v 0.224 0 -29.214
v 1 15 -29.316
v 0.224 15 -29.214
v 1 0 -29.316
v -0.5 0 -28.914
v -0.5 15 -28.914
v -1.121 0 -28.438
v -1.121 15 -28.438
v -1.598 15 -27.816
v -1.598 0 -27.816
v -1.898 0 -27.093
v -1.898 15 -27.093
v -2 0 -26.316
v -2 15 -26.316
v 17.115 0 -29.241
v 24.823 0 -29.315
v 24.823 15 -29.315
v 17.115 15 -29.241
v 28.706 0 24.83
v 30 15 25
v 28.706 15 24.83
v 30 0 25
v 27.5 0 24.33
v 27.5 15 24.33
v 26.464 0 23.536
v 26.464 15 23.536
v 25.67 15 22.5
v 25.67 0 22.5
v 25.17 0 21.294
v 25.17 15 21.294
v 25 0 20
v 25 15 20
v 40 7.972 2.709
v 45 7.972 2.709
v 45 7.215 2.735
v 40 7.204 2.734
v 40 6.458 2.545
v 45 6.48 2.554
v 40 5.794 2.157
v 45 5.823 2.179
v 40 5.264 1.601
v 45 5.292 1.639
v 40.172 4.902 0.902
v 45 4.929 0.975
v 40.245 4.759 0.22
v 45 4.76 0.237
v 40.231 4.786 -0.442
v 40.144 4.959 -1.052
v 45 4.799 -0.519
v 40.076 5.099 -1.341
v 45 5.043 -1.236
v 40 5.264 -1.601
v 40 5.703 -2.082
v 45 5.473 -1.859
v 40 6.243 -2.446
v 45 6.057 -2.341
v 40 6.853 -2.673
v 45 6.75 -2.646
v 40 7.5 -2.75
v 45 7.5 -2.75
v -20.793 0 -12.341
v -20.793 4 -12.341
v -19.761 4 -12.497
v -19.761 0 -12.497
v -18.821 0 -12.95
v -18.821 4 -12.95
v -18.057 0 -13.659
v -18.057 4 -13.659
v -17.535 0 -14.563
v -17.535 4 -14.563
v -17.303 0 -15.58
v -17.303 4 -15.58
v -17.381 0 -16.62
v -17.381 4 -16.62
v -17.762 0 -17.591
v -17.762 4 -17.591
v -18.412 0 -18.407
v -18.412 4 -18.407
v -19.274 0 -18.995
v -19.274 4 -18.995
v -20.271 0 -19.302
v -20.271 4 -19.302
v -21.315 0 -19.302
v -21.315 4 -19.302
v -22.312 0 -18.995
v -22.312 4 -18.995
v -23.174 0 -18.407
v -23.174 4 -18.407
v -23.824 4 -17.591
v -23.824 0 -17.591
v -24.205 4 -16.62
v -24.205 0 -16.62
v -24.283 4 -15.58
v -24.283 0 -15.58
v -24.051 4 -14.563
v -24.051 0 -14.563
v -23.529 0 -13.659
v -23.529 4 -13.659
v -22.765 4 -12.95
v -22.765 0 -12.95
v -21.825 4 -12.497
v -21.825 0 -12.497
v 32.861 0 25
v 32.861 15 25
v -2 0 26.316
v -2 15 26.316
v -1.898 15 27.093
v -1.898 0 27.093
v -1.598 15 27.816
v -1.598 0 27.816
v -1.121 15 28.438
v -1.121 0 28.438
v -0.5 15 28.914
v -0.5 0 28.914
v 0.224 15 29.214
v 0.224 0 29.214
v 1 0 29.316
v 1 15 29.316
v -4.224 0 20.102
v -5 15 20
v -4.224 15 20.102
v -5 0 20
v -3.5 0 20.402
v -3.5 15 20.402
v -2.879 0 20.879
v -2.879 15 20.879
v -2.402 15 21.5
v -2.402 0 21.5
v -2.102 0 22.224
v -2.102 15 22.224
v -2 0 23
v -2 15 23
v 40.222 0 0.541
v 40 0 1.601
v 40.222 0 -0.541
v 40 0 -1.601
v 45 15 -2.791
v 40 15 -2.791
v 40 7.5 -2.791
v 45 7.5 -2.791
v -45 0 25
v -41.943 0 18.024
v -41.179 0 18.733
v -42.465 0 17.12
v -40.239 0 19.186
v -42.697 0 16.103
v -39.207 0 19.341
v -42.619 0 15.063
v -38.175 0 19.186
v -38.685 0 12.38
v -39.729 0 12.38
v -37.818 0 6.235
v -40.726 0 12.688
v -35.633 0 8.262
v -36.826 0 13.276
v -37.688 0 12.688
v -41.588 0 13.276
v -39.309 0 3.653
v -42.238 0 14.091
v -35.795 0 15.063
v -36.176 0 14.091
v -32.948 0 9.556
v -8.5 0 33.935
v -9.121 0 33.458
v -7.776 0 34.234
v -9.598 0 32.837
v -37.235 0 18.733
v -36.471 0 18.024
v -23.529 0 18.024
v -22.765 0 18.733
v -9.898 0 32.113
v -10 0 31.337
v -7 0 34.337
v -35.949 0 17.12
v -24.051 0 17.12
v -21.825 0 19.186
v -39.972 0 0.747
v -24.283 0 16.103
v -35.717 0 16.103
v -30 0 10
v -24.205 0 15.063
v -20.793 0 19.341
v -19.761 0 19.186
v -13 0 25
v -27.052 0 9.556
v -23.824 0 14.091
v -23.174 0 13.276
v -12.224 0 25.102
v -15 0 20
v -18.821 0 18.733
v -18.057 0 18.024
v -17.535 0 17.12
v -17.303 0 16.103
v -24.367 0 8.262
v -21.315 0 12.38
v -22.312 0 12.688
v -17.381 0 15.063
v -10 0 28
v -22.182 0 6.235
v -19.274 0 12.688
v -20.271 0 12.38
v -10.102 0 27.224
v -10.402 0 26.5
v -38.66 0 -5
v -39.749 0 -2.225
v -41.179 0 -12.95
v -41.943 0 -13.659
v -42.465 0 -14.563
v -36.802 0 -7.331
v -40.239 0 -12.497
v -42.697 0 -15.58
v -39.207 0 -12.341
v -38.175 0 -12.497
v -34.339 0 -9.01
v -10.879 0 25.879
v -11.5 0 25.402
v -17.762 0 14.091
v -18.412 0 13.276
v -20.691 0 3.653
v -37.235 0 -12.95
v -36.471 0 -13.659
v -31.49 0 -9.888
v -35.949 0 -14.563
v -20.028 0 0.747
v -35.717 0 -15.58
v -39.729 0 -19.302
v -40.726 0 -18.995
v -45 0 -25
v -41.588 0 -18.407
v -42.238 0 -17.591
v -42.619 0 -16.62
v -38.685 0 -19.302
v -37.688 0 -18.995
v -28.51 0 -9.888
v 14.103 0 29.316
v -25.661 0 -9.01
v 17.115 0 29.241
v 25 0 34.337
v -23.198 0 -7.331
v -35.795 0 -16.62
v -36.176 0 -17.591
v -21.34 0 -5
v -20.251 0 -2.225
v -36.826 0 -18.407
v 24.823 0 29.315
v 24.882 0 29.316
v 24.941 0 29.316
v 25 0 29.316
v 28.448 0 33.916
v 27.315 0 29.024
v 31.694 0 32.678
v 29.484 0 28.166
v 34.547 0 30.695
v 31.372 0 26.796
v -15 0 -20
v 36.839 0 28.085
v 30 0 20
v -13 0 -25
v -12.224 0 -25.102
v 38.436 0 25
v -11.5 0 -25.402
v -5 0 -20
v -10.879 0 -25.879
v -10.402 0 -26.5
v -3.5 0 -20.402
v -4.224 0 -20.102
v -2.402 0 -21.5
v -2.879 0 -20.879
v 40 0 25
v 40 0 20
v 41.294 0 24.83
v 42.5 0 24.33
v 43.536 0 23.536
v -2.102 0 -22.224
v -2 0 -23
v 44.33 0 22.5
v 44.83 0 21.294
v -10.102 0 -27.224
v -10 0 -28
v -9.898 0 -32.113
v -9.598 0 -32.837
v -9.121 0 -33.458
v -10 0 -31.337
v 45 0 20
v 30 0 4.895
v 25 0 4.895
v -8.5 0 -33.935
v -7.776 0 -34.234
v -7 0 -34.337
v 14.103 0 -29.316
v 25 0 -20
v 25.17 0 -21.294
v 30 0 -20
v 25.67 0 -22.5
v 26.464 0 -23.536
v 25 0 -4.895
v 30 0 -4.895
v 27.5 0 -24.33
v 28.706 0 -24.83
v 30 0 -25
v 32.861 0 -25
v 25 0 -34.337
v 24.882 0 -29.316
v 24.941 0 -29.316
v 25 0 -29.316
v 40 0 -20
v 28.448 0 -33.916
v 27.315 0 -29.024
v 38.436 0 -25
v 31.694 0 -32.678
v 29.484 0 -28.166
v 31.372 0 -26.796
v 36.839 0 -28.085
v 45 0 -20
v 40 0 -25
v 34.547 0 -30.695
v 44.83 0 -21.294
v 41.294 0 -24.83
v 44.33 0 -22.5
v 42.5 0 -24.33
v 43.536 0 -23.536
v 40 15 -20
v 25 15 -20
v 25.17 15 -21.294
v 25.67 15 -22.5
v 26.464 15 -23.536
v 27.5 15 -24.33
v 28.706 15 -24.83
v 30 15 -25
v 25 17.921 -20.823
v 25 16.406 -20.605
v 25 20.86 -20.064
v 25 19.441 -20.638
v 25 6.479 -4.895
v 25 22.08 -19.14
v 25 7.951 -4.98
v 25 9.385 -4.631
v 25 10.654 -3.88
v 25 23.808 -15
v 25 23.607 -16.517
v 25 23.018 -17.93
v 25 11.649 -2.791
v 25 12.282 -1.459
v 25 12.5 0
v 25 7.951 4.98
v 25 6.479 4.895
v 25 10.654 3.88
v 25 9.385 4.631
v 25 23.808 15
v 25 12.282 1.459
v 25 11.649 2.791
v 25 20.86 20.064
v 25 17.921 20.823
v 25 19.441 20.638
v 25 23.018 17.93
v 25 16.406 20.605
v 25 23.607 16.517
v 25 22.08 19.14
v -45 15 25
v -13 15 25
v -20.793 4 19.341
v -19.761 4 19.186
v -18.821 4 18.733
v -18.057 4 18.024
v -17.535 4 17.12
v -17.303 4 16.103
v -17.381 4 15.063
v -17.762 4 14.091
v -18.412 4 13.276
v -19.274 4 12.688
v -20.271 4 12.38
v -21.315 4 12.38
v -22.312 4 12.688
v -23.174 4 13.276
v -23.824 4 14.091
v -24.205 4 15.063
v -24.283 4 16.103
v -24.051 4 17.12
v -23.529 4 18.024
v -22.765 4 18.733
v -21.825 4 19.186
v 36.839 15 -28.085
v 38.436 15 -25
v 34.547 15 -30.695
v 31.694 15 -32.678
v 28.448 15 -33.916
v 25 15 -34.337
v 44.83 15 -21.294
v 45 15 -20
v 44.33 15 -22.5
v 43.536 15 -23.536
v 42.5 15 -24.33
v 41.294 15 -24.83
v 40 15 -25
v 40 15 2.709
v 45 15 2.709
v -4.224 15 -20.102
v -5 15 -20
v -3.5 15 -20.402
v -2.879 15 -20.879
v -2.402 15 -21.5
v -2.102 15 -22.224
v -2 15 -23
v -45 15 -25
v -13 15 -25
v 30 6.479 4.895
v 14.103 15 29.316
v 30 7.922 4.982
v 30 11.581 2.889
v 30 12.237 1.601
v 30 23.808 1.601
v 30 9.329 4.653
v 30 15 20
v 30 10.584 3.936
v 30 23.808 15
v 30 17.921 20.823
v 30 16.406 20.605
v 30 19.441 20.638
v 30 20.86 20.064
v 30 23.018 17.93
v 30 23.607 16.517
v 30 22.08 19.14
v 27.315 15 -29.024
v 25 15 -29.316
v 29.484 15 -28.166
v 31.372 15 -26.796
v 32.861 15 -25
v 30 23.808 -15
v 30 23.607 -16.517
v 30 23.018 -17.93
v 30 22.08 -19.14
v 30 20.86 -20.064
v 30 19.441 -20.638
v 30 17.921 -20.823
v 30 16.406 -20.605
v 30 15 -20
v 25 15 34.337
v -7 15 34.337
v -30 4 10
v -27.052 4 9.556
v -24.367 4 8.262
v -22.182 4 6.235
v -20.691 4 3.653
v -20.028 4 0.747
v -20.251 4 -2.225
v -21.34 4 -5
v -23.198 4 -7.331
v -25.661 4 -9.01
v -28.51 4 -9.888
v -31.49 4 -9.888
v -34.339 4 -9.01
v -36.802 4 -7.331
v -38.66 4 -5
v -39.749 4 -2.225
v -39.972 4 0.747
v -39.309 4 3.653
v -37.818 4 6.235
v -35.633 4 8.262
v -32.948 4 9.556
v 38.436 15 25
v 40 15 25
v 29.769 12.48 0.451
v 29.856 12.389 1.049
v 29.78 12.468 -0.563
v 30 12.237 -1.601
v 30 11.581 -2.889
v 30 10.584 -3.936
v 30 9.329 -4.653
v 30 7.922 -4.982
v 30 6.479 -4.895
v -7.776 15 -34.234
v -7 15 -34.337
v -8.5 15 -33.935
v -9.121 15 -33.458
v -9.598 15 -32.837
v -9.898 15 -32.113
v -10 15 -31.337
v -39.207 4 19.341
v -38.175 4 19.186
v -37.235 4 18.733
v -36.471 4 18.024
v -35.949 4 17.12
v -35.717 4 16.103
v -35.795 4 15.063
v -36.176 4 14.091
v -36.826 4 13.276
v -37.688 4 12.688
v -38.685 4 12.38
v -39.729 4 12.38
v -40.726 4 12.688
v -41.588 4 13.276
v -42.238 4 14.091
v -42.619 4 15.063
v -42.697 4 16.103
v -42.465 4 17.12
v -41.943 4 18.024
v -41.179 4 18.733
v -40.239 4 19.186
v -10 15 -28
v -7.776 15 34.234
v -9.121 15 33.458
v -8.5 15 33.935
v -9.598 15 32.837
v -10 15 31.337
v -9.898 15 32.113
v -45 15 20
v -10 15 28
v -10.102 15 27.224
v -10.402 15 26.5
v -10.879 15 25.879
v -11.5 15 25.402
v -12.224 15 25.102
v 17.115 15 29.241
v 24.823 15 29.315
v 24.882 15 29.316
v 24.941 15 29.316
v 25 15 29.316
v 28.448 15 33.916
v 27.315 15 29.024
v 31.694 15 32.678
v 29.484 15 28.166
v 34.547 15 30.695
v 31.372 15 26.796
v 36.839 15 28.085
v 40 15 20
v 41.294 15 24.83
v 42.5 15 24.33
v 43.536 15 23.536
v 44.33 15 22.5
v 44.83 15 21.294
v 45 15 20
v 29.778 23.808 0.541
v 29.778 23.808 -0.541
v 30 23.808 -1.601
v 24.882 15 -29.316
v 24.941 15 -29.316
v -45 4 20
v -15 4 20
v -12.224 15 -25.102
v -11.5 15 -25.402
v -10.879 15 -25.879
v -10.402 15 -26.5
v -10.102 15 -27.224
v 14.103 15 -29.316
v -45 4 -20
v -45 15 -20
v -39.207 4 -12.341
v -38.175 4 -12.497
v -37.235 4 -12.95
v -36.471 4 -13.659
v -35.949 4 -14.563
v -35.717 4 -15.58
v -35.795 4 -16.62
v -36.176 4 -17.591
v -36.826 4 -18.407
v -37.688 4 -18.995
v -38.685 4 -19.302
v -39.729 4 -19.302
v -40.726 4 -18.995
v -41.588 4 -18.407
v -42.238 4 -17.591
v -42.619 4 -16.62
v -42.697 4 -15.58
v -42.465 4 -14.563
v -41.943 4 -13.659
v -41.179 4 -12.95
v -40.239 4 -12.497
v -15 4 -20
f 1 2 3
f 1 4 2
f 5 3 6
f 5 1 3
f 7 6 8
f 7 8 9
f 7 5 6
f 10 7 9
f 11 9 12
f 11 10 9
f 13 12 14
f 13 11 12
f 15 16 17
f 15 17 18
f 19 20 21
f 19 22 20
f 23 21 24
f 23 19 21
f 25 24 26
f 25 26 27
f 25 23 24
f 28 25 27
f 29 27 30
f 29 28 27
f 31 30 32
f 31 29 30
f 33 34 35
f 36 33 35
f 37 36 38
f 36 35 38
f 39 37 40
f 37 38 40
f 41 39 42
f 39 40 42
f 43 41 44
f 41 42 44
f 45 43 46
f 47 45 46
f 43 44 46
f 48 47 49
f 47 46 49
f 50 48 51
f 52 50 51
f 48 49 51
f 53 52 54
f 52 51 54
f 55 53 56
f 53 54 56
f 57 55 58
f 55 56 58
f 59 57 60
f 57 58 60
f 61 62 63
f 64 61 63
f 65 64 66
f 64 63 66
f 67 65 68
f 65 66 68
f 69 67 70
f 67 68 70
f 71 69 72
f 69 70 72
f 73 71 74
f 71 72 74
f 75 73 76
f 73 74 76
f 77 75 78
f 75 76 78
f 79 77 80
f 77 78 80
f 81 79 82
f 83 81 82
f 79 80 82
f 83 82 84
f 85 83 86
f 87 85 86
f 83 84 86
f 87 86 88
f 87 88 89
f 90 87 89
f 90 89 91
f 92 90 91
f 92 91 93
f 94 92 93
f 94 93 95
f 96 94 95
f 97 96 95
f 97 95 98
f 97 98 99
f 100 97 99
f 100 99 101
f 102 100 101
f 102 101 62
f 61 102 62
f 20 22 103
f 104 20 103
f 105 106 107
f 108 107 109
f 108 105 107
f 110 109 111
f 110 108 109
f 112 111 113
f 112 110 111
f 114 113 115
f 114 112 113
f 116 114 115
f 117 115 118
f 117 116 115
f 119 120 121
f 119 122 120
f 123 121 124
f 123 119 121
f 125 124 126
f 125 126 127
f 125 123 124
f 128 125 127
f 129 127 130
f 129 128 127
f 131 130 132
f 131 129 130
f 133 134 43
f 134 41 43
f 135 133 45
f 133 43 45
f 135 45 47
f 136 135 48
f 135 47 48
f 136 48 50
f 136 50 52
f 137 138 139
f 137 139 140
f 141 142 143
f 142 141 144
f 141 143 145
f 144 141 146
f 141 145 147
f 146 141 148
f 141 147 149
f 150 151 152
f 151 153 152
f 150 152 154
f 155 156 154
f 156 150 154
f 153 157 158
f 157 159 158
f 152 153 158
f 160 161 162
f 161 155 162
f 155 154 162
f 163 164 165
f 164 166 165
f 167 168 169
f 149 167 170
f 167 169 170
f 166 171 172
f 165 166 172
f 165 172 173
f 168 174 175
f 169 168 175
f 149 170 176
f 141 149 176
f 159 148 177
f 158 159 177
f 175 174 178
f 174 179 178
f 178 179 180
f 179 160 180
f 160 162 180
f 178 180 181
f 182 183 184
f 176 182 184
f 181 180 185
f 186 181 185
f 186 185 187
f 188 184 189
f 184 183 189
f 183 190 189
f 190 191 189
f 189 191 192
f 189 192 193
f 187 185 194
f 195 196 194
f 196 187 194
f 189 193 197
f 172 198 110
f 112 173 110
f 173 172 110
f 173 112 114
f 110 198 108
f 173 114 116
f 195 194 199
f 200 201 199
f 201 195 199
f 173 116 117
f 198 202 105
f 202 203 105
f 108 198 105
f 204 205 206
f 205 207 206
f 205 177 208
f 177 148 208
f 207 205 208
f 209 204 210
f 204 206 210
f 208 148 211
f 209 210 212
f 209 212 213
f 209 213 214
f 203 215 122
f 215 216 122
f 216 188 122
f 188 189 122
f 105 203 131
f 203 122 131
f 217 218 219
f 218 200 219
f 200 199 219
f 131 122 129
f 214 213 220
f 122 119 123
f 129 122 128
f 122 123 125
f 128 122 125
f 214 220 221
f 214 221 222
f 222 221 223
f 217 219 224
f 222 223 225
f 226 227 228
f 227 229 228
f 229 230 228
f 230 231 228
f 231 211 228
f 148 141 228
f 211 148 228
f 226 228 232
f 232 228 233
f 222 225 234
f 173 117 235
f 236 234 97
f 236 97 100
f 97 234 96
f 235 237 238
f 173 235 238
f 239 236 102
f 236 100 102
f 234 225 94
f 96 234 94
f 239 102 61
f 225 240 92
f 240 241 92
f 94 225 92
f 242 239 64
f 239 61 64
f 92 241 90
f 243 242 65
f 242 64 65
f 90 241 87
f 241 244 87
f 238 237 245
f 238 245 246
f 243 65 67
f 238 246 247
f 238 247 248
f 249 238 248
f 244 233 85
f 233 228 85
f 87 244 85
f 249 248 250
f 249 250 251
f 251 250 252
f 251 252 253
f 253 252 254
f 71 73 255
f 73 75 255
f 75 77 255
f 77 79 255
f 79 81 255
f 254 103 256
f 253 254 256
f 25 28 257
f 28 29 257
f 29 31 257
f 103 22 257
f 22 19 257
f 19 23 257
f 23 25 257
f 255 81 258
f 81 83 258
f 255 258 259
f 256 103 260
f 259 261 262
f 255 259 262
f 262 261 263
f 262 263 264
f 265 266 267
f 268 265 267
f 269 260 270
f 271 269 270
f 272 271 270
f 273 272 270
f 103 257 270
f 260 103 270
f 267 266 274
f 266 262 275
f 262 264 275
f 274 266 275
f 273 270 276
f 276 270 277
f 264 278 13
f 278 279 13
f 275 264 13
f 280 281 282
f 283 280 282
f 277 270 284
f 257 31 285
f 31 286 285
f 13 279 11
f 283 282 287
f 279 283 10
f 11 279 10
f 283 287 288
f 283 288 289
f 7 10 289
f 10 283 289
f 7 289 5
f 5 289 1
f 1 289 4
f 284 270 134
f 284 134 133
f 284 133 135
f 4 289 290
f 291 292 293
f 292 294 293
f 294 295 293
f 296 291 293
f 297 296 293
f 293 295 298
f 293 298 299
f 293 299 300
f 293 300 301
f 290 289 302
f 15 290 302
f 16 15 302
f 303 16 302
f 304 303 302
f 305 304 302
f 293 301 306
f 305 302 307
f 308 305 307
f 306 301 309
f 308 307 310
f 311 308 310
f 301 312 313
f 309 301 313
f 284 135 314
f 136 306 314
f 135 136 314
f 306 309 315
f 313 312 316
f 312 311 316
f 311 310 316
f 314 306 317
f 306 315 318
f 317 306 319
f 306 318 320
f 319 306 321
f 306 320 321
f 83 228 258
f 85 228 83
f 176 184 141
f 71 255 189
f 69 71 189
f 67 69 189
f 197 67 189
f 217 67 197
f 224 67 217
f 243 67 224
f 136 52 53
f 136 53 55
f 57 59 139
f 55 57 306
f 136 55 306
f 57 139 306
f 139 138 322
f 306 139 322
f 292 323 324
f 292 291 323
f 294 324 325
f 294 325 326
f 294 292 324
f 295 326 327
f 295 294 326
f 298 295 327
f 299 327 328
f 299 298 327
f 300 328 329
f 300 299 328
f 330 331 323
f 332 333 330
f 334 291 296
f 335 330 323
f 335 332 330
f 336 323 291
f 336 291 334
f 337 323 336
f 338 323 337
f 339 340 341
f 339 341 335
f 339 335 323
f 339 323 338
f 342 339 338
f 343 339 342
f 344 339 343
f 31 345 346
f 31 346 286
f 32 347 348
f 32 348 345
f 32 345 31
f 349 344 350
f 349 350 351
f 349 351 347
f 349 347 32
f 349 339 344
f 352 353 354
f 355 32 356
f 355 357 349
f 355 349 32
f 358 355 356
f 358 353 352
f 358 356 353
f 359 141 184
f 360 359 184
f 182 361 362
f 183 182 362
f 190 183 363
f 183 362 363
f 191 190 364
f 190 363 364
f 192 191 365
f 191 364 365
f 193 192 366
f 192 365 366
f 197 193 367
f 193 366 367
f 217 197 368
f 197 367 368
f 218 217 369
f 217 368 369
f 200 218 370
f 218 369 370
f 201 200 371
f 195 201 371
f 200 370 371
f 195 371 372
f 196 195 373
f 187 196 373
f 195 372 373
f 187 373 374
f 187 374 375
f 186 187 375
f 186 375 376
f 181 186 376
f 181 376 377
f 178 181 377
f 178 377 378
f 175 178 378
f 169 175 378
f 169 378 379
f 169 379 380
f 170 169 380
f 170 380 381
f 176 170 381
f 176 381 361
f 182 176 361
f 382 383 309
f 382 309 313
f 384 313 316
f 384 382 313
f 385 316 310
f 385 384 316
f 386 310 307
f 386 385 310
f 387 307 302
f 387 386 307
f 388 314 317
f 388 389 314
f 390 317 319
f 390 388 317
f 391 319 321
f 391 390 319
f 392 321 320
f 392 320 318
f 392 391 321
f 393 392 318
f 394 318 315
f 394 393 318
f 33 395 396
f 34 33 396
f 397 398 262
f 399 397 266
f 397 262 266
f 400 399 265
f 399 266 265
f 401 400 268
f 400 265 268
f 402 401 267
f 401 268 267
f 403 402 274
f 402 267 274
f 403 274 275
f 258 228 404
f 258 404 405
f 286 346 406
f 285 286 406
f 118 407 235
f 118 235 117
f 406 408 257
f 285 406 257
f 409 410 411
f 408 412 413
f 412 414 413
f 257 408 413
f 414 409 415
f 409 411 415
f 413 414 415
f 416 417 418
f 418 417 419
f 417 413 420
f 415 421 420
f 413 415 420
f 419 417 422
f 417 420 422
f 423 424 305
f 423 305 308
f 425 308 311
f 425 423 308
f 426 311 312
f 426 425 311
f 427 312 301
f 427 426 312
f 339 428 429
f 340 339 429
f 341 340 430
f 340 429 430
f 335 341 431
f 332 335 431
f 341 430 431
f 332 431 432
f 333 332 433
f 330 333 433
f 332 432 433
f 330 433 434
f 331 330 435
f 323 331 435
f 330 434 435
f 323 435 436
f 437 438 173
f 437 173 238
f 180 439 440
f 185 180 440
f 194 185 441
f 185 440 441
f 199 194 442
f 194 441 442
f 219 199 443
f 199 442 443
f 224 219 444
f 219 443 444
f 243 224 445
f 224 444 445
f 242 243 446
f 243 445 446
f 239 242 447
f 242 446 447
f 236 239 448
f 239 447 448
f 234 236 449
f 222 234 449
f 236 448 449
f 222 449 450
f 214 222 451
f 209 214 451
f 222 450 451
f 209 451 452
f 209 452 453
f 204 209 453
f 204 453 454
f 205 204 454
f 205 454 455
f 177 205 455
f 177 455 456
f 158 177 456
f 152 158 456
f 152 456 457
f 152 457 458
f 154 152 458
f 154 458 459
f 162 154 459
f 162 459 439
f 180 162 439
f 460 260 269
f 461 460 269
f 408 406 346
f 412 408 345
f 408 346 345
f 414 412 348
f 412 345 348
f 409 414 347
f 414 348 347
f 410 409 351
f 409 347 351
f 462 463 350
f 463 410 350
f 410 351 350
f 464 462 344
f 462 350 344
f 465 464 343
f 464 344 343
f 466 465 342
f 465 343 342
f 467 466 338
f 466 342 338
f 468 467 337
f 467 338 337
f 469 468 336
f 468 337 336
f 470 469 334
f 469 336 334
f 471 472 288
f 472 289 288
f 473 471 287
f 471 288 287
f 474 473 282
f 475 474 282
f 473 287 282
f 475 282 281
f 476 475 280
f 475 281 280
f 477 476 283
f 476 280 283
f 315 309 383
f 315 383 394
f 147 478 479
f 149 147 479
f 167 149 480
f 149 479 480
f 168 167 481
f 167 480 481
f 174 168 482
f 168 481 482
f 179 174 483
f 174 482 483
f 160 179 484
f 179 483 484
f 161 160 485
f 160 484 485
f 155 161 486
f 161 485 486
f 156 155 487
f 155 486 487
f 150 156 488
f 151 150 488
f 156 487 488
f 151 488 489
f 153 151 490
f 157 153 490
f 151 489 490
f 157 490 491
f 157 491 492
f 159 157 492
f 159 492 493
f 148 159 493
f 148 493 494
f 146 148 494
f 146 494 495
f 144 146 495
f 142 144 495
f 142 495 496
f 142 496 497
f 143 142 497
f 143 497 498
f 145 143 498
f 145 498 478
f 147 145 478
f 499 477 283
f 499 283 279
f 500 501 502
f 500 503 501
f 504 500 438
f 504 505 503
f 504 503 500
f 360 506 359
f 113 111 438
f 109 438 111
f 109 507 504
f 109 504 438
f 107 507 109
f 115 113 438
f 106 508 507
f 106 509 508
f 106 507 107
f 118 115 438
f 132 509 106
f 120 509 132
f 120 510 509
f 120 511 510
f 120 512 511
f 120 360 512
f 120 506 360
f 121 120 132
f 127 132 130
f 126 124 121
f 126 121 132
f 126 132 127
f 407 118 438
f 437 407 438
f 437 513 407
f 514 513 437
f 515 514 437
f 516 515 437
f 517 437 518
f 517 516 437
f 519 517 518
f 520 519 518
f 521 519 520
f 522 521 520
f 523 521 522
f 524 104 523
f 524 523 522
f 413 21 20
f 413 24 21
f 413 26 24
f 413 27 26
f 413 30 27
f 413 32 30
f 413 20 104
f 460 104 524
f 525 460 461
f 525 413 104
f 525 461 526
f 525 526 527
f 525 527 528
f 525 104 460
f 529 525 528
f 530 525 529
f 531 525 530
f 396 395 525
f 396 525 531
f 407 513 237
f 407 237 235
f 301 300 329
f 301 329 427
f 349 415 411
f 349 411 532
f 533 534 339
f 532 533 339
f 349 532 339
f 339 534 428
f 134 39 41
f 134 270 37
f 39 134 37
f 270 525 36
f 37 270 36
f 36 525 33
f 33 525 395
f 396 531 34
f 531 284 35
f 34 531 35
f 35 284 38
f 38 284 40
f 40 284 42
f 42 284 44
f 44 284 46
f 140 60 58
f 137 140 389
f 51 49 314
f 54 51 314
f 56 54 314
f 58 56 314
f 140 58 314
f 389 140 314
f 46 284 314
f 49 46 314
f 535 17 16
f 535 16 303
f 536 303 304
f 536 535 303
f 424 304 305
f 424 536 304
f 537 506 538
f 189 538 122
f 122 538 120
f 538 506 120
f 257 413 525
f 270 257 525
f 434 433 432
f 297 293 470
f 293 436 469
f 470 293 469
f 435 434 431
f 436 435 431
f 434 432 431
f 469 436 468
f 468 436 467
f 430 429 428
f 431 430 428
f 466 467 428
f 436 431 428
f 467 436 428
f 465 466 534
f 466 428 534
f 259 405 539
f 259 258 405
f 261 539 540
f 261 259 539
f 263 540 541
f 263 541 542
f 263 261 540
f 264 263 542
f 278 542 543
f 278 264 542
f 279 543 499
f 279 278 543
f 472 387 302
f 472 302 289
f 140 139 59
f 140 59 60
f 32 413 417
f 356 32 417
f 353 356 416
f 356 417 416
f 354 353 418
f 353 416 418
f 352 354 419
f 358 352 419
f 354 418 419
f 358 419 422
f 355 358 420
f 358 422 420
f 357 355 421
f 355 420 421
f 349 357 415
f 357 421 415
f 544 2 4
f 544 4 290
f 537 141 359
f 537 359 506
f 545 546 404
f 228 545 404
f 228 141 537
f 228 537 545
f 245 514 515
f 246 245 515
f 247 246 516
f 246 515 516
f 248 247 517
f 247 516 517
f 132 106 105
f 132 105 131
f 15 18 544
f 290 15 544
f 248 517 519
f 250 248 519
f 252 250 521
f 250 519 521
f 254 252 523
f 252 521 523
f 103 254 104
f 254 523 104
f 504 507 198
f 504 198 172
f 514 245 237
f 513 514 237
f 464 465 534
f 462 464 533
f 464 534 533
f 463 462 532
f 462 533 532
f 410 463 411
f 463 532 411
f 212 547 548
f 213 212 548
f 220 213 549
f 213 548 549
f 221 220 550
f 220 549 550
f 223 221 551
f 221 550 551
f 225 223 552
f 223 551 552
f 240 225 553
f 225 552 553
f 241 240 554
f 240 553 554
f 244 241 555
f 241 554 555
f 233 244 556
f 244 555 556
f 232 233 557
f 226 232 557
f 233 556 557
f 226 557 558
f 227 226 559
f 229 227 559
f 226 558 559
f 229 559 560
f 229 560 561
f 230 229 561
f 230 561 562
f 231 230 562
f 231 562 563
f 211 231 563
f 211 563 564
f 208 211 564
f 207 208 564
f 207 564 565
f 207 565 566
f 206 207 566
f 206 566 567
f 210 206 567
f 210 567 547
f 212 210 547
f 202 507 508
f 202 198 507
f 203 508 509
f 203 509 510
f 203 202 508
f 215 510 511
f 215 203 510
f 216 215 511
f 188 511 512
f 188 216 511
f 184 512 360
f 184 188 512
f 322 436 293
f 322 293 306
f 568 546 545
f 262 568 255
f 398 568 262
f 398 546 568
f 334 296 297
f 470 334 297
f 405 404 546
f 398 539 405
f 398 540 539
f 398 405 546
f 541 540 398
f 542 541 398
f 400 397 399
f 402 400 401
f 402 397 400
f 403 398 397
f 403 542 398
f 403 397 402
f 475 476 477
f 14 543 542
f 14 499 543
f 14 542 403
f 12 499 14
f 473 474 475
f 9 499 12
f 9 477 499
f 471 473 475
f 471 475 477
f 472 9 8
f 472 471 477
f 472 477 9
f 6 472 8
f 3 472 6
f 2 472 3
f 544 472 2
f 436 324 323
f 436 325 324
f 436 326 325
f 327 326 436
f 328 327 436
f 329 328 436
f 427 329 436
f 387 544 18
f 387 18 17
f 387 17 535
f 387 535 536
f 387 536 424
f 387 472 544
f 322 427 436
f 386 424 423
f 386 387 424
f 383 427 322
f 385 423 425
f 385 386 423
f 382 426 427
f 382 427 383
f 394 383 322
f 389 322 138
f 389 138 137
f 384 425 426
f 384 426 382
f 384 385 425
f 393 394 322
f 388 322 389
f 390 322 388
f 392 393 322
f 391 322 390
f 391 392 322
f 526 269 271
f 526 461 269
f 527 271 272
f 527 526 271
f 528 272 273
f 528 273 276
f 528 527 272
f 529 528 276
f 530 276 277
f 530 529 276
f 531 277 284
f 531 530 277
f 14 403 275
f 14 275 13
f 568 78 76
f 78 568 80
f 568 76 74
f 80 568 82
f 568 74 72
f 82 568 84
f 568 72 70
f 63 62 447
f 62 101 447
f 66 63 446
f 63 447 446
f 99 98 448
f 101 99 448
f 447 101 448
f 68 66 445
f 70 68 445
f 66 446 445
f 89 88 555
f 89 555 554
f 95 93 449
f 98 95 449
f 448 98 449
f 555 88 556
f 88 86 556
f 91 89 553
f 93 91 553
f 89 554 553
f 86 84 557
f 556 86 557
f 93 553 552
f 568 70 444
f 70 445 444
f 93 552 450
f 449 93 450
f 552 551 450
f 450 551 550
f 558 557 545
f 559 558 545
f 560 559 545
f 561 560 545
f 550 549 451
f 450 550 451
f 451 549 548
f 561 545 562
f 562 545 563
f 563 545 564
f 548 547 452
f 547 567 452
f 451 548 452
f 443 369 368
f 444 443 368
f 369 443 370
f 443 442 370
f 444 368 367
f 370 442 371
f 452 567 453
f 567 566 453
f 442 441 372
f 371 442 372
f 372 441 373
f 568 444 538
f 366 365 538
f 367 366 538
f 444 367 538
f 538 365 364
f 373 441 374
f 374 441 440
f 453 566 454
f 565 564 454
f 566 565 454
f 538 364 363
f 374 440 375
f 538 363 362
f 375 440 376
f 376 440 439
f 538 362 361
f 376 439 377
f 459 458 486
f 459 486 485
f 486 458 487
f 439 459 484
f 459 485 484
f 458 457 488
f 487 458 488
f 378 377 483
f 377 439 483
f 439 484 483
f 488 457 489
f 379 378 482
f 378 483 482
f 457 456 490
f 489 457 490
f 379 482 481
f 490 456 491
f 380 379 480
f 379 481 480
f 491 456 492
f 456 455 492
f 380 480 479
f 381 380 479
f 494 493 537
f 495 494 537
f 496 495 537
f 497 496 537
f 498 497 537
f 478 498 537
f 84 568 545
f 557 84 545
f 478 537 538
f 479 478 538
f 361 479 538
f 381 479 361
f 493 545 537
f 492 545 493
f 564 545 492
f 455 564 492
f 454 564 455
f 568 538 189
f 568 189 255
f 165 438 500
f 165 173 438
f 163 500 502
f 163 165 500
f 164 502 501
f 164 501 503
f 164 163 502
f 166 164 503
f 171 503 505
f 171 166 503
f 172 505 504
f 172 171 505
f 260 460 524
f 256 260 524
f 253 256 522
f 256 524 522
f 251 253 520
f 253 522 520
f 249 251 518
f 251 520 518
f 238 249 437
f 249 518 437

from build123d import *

# Parameters (mm, degrees)
SKETCH1_W           = 90
SKETCH1_H           = 50
BOSS_EXTRUDE1_DEPTH = 15
SKETCH2_W           = 40
SKETCH2_H           = 40
SKETCH2_W_2         = 10
CUT_EXTRUDE1_DEPTH  = 15
SKETCH6_R           = 2.75
CUT_EXTRUDE4_DEPTH  = 7
SKETCH8_R           = 5
CUT_EXTRUDE5_DEPTH  = 7
BOSS_EXTRUDE2_DEPTH = 15
SKETCH11_W          = 7.860960604
SKETCH11_H          = 5
CUT_EXTRUDE7_DEPTH  = 15
FILLET1_R           = 5
FILLET2_R           = 5
FILLET3_R           = 5
FILLET4_R           = 5
FILLET5_R           = 5
SKETCH12_W          = 6.801796193
SKETCH12_H          = 5.5
CUT_EXTRUDE8_DEPTH  = 7.5
SKETCH13_W          = 7.647159446
SKETCH13_H          = 9.789246186
CUT_EXTRUDE9_DEPTH  = 7.5
BOSS_EXTRUDE4_DEPTH = 5
SKETCH16_W          = 30
SKETCH16_H          = 40
CUT_EXTRUDE10_DEPTH = 5
SKETCH18_R          = 10
SKETCH18_R_2        = 3.5
CUT_EXTRUDE12_DEPTH = 11
SKETCH17_R          = 5.25
CUT_EXTRUDE13_DEPTH = 32
BOSS_EXTRUDE5_DEPTH = 15
CUT_EXTRUDE14_DEPTH = 15
FILLET7_R           = 3
SKETCH21_W          = 40
SKETCH21_H          = 6
CUT_EXTRUDE15_DEPTH = 30


with BuildPart() as part:
    # Sketch1 → Boss-Extrude1 (new body)
    with BuildSketch(Plane(origin=(0, 0, 0), x_dir=(1, 0, 0), z_dir=(0, 1, 0))):
        Rectangle(SKETCH1_W, SKETCH1_H)
    extrude(amount=BOSS_EXTRUDE1_DEPTH)

    # Sketch2 → Cut-Extrude1 (cut)
    with BuildSketch(Plane(origin=(0, 15, 0), x_dir=(1, 0, 0), z_dir=(0, 1, 0))):
        with Locations((5, 0)):
            Rectangle(SKETCH2_W, SKETCH2_H)
        with Locations((35, 0)):
            Rectangle(SKETCH2_W_2, SKETCH2_H)
    extrude(amount=-CUT_EXTRUDE1_DEPTH, mode=Mode.SUBTRACT)

    # Sketch6 → Cut-Extrude4 (cut)
    with BuildSketch(Plane(origin=(45, 0, 0), x_dir=(0, 0, -1), z_dir=(1, 0, 0))):
        with Locations((0, 7.5)):
            Circle(SKETCH6_R)
    extrude(amount=-CUT_EXTRUDE4_DEPTH, mode=Mode.SUBTRACT)

    # Sketch8 → Cut-Extrude5 (cut)
    with BuildSketch(Plane.ZY.offset(-25)):
        with Locations((0, 7.5)):
            Circle(SKETCH8_R)
    extrude(amount=-CUT_EXTRUDE5_DEPTH, mode=Mode.SUBTRACT)

    # Sketch10 → Boss-Extrude2 (add)
    with BuildSketch(Plane(origin=(0, 15, 0), x_dir=(1, 0, 0), z_dir=(0, 1, 0))):
        with BuildLine():
            Line((11.563534407, 25), (17.139039396, 25))
            ThreePointArc((17.139039396, 25), (20.515980342, 28.166288589), (25, 29.316367404))
            ThreePointArc((25, 29.316367404), (29.484019658, 28.166288589), (32.860960604, 25))
            Line((32.860960604, 25), (38.436465593, 25))
            ThreePointArc((38.436465593, 25), (33.180938792, 31.773310839), (25, 34.336617719))
            ThreePointArc((25, 34.336617719), (16.819061208, 31.773310839), (11.563534407, 25))
        make_face()
        with BuildLine():
            Line((11.563534407, -25), (17.139039396, -25))
            ThreePointArc((17.139039396, -25), (20.515980342, -28.166288589), (25, -29.316367404))
            ThreePointArc((25, -29.316367404), (29.484019658, -28.166288589), (32.860960604, -25))
            Line((32.860960604, -25), (38.436465593, -25))
            ThreePointArc((38.436465593, -25), (33.180938792, -31.773310839), (25, -34.336617719))
            ThreePointArc((25, -34.336617719), (16.819061208, -31.773310839), (11.563534407, -25))
        make_face()
    extrude(amount=-BOSS_EXTRUDE2_DEPTH)

    # Sketch11 → Cut-Extrude7 (cut)
    with BuildSketch(Plane(origin=(0, 15, 0), x_dir=(1, 0, 0), z_dir=(0, 1, 0))):
        with Locations((21.069519698, 22.5)):
            Rectangle(SKETCH11_W, SKETCH11_H)
        with Locations((21.069519698, -22.5)):
            Rectangle(SKETCH11_W, SKETCH11_H)
    extrude(amount=-CUT_EXTRUDE7_DEPTH, mode=Mode.SUBTRACT)

    # Fillet1
    fillet1_edges = [part.edges().sort_by_distance(p)[0] for p in [
        (25, 7.5, 25),
        (25, 7.5, -25),
    ]]
    fillet(fillet1_edges, radius=FILLET1_R)

    # Fillet2
    fillet2_edges = [part.edges().sort_by_distance(p)[0] for p in [
        (17.139039396, 7.5, 20),
        (17.139039396, 7.5, -20),
    ]]
    fillet(fillet2_edges, radius=FILLET2_R - 0.0001)  # a hair under: the kernel refuses the full size

    # Fillet3
    fillet3_edges = [part.edges().sort_by_distance(p)[0] for p in [
        (17.139039396, 7.5, -25),
        (17.139039396, 7.5, 25),
    ]]
    fillet(fillet3_edges, radius=FILLET3_R)

    # Fillet4
    fillet4_edges = [part.edges().sort_by_distance(p)[0] for p in [
        (45, 7.5, 25),
        (45, 7.5, -25),
    ]]
    fillet(fillet4_edges, radius=FILLET4_R)

    # Fillet5
    fillet5_edges = [part.edges().sort_by_distance(p)[0] for p in [
        (11.563534407, 7.5, -25),
        (11.563534407, 7.5, 25),
    ]]
    fillet(fillet5_edges, radius=FILLET5_R)

    # Sketch12 → Cut-Extrude8 (cut)
    with BuildSketch(Plane(origin=(0, 15, 0), x_dir=(1, 0, 0), z_dir=(0, 1, 0))):
        with Locations((42.246807925, 0.040811044)):
            Rectangle(SKETCH12_W, SKETCH12_H)
    extrude(amount=-CUT_EXTRUDE8_DEPTH, mode=Mode.SUBTRACT)

    # Sketch13 → Cut-Extrude9 (cut)
    with BuildSketch(Plane.XZ):
        with Locations((27.507381734, 0)):
            Rectangle(SKETCH13_W, SKETCH13_H)
    extrude(amount=-CUT_EXTRUDE9_DEPTH, mode=Mode.SUBTRACT)

    # Sketch15 → Boss-Extrude4 (add)
    with BuildSketch(Plane(origin=(30, 0, 0), x_dir=(0, 0, -1), z_dir=(1, 0, 0))):
        with BuildLine():
            Line((-15, 23.80846108), (15, 23.80846108))
            ThreePointArc((15, 23.80846108), (20.064311074, 20.859825933), (20, 15))
            Line((20, 15), (-20, 15))
            ThreePointArc((-20, 15), (-20.064311074, 20.859825933), (-15, 23.80846108))
        make_face()
    extrude(amount=-BOSS_EXTRUDE4_DEPTH)

    # Sketch16 → Cut-Extrude10 (cut)
    with BuildSketch(Plane(origin=(0, 15, 0), x_dir=(1, 0, 0), z_dir=(0, 1, 0))):
        with Locations((-30, 0)):
            Rectangle(SKETCH16_W, SKETCH16_H)
    extrude(amount=-CUT_EXTRUDE10_DEPTH, mode=Mode.SUBTRACT)

    # Sketch18 → Cut-Extrude12 (cut)
    with BuildSketch(Plane(origin=(0, 10, 0), x_dir=(1, 0, 0), z_dir=(0, 1, 0))):
        with Locations(Location((-30, 0, 0), (0, 0, 270))):
            Circle(SKETCH18_R)
        with Locations(Location((-39.206960866, 15.841368379, 0), (0, 0, 270))):
            Circle(SKETCH18_R_2)
        with Locations(Location((-20.793039134, 15.841368379, 0), (0, 0, 270))):
            Circle(SKETCH18_R_2)
        with Locations(Location((-20.793039134, -15.841368379, 0), (0, 0, 270))):
            Circle(SKETCH18_R_2)
        with Locations(Location((-39.206960866, -15.841368379, 0), (0, 0, 270))):
            Circle(SKETCH18_R_2)
    extrude(amount=-CUT_EXTRUDE12_DEPTH, mode=Mode.SUBTRACT)

    # Sketch17 → Cut-Extrude13 (cut)
    with BuildSketch(Plane(origin=(0, 23.80846108, 0), x_dir=(1, 0, 0), z_dir=(0, 1, 0))):
        with Locations((35, 0)):
            Circle(SKETCH17_R)
    extrude(amount=-CUT_EXTRUDE13_DEPTH, mode=Mode.SUBTRACT)

    # Sketch19 → Boss-Extrude5 (add)
    with BuildSketch(Plane(origin=(0, 15, 0), x_dir=(1, 0, 0), z_dir=(0, 1, 0))):
        Polygon((25, 34.336617719), (-10, 34.336617719), (-10, 25), (-2, 25), (-2, 29.316367404), (25, 29.316367404), align=None)
        Polygon((-2, -29.316367404), (-2, -25), (-10, -25), (-10, -34.336617719), (25, -34.336617719), (25, -29.316367404), align=None)
    extrude(amount=-BOSS_EXTRUDE5_DEPTH)

    # Sketch20 → Cut-Extrude14 (cut)
    with BuildSketch(Plane(origin=(0, 15, 0), x_dir=(1, 0, 0), z_dir=(0, 1, 0))):
        Polygon((-2, -25), (-2, -20), (17.115013572, -20), (25, -29.316367404), (17.115013572, -29.241305009), (14.103032256, -29.316367404), align=None)
        Polygon((17.115013572, 29.241305009), (14.103032256, 29.316367404), (-2, 25), (-2, 20), (17.115013572, 20), (25, 29.316367404), align=None)
    extrude(amount=-CUT_EXTRUDE14_DEPTH, mode=Mode.SUBTRACT)

    # Fillet7
    fillet7_edges = [part.edges().sort_by_distance(p)[0] for p in [
        (-2, 7.5, -29.316367404),
        (-10, 7.5, -25),
        (-10, 7.5, -34.336617719),
        (-2, 7.5, 29.316367404),
        (-10, 7.5, 34.336617719),
        (-10, 7.5, 25),
        (-2, 7.5, 20),
        (-2, 7.5, -20),
    ]]
    fillet(fillet7_edges, radius=FILLET7_R)

    # Sketch21 → Cut-Extrude15 (cut)
    with BuildSketch(Plane.ZY.offset(45)):
        with Locations((0, 7)):
            Rectangle(SKETCH21_W, SKETCH21_H)
    extrude(amount=-CUT_EXTRUDE15_DEPTH, mode=Mode.SUBTRACT)


solid = part.part
